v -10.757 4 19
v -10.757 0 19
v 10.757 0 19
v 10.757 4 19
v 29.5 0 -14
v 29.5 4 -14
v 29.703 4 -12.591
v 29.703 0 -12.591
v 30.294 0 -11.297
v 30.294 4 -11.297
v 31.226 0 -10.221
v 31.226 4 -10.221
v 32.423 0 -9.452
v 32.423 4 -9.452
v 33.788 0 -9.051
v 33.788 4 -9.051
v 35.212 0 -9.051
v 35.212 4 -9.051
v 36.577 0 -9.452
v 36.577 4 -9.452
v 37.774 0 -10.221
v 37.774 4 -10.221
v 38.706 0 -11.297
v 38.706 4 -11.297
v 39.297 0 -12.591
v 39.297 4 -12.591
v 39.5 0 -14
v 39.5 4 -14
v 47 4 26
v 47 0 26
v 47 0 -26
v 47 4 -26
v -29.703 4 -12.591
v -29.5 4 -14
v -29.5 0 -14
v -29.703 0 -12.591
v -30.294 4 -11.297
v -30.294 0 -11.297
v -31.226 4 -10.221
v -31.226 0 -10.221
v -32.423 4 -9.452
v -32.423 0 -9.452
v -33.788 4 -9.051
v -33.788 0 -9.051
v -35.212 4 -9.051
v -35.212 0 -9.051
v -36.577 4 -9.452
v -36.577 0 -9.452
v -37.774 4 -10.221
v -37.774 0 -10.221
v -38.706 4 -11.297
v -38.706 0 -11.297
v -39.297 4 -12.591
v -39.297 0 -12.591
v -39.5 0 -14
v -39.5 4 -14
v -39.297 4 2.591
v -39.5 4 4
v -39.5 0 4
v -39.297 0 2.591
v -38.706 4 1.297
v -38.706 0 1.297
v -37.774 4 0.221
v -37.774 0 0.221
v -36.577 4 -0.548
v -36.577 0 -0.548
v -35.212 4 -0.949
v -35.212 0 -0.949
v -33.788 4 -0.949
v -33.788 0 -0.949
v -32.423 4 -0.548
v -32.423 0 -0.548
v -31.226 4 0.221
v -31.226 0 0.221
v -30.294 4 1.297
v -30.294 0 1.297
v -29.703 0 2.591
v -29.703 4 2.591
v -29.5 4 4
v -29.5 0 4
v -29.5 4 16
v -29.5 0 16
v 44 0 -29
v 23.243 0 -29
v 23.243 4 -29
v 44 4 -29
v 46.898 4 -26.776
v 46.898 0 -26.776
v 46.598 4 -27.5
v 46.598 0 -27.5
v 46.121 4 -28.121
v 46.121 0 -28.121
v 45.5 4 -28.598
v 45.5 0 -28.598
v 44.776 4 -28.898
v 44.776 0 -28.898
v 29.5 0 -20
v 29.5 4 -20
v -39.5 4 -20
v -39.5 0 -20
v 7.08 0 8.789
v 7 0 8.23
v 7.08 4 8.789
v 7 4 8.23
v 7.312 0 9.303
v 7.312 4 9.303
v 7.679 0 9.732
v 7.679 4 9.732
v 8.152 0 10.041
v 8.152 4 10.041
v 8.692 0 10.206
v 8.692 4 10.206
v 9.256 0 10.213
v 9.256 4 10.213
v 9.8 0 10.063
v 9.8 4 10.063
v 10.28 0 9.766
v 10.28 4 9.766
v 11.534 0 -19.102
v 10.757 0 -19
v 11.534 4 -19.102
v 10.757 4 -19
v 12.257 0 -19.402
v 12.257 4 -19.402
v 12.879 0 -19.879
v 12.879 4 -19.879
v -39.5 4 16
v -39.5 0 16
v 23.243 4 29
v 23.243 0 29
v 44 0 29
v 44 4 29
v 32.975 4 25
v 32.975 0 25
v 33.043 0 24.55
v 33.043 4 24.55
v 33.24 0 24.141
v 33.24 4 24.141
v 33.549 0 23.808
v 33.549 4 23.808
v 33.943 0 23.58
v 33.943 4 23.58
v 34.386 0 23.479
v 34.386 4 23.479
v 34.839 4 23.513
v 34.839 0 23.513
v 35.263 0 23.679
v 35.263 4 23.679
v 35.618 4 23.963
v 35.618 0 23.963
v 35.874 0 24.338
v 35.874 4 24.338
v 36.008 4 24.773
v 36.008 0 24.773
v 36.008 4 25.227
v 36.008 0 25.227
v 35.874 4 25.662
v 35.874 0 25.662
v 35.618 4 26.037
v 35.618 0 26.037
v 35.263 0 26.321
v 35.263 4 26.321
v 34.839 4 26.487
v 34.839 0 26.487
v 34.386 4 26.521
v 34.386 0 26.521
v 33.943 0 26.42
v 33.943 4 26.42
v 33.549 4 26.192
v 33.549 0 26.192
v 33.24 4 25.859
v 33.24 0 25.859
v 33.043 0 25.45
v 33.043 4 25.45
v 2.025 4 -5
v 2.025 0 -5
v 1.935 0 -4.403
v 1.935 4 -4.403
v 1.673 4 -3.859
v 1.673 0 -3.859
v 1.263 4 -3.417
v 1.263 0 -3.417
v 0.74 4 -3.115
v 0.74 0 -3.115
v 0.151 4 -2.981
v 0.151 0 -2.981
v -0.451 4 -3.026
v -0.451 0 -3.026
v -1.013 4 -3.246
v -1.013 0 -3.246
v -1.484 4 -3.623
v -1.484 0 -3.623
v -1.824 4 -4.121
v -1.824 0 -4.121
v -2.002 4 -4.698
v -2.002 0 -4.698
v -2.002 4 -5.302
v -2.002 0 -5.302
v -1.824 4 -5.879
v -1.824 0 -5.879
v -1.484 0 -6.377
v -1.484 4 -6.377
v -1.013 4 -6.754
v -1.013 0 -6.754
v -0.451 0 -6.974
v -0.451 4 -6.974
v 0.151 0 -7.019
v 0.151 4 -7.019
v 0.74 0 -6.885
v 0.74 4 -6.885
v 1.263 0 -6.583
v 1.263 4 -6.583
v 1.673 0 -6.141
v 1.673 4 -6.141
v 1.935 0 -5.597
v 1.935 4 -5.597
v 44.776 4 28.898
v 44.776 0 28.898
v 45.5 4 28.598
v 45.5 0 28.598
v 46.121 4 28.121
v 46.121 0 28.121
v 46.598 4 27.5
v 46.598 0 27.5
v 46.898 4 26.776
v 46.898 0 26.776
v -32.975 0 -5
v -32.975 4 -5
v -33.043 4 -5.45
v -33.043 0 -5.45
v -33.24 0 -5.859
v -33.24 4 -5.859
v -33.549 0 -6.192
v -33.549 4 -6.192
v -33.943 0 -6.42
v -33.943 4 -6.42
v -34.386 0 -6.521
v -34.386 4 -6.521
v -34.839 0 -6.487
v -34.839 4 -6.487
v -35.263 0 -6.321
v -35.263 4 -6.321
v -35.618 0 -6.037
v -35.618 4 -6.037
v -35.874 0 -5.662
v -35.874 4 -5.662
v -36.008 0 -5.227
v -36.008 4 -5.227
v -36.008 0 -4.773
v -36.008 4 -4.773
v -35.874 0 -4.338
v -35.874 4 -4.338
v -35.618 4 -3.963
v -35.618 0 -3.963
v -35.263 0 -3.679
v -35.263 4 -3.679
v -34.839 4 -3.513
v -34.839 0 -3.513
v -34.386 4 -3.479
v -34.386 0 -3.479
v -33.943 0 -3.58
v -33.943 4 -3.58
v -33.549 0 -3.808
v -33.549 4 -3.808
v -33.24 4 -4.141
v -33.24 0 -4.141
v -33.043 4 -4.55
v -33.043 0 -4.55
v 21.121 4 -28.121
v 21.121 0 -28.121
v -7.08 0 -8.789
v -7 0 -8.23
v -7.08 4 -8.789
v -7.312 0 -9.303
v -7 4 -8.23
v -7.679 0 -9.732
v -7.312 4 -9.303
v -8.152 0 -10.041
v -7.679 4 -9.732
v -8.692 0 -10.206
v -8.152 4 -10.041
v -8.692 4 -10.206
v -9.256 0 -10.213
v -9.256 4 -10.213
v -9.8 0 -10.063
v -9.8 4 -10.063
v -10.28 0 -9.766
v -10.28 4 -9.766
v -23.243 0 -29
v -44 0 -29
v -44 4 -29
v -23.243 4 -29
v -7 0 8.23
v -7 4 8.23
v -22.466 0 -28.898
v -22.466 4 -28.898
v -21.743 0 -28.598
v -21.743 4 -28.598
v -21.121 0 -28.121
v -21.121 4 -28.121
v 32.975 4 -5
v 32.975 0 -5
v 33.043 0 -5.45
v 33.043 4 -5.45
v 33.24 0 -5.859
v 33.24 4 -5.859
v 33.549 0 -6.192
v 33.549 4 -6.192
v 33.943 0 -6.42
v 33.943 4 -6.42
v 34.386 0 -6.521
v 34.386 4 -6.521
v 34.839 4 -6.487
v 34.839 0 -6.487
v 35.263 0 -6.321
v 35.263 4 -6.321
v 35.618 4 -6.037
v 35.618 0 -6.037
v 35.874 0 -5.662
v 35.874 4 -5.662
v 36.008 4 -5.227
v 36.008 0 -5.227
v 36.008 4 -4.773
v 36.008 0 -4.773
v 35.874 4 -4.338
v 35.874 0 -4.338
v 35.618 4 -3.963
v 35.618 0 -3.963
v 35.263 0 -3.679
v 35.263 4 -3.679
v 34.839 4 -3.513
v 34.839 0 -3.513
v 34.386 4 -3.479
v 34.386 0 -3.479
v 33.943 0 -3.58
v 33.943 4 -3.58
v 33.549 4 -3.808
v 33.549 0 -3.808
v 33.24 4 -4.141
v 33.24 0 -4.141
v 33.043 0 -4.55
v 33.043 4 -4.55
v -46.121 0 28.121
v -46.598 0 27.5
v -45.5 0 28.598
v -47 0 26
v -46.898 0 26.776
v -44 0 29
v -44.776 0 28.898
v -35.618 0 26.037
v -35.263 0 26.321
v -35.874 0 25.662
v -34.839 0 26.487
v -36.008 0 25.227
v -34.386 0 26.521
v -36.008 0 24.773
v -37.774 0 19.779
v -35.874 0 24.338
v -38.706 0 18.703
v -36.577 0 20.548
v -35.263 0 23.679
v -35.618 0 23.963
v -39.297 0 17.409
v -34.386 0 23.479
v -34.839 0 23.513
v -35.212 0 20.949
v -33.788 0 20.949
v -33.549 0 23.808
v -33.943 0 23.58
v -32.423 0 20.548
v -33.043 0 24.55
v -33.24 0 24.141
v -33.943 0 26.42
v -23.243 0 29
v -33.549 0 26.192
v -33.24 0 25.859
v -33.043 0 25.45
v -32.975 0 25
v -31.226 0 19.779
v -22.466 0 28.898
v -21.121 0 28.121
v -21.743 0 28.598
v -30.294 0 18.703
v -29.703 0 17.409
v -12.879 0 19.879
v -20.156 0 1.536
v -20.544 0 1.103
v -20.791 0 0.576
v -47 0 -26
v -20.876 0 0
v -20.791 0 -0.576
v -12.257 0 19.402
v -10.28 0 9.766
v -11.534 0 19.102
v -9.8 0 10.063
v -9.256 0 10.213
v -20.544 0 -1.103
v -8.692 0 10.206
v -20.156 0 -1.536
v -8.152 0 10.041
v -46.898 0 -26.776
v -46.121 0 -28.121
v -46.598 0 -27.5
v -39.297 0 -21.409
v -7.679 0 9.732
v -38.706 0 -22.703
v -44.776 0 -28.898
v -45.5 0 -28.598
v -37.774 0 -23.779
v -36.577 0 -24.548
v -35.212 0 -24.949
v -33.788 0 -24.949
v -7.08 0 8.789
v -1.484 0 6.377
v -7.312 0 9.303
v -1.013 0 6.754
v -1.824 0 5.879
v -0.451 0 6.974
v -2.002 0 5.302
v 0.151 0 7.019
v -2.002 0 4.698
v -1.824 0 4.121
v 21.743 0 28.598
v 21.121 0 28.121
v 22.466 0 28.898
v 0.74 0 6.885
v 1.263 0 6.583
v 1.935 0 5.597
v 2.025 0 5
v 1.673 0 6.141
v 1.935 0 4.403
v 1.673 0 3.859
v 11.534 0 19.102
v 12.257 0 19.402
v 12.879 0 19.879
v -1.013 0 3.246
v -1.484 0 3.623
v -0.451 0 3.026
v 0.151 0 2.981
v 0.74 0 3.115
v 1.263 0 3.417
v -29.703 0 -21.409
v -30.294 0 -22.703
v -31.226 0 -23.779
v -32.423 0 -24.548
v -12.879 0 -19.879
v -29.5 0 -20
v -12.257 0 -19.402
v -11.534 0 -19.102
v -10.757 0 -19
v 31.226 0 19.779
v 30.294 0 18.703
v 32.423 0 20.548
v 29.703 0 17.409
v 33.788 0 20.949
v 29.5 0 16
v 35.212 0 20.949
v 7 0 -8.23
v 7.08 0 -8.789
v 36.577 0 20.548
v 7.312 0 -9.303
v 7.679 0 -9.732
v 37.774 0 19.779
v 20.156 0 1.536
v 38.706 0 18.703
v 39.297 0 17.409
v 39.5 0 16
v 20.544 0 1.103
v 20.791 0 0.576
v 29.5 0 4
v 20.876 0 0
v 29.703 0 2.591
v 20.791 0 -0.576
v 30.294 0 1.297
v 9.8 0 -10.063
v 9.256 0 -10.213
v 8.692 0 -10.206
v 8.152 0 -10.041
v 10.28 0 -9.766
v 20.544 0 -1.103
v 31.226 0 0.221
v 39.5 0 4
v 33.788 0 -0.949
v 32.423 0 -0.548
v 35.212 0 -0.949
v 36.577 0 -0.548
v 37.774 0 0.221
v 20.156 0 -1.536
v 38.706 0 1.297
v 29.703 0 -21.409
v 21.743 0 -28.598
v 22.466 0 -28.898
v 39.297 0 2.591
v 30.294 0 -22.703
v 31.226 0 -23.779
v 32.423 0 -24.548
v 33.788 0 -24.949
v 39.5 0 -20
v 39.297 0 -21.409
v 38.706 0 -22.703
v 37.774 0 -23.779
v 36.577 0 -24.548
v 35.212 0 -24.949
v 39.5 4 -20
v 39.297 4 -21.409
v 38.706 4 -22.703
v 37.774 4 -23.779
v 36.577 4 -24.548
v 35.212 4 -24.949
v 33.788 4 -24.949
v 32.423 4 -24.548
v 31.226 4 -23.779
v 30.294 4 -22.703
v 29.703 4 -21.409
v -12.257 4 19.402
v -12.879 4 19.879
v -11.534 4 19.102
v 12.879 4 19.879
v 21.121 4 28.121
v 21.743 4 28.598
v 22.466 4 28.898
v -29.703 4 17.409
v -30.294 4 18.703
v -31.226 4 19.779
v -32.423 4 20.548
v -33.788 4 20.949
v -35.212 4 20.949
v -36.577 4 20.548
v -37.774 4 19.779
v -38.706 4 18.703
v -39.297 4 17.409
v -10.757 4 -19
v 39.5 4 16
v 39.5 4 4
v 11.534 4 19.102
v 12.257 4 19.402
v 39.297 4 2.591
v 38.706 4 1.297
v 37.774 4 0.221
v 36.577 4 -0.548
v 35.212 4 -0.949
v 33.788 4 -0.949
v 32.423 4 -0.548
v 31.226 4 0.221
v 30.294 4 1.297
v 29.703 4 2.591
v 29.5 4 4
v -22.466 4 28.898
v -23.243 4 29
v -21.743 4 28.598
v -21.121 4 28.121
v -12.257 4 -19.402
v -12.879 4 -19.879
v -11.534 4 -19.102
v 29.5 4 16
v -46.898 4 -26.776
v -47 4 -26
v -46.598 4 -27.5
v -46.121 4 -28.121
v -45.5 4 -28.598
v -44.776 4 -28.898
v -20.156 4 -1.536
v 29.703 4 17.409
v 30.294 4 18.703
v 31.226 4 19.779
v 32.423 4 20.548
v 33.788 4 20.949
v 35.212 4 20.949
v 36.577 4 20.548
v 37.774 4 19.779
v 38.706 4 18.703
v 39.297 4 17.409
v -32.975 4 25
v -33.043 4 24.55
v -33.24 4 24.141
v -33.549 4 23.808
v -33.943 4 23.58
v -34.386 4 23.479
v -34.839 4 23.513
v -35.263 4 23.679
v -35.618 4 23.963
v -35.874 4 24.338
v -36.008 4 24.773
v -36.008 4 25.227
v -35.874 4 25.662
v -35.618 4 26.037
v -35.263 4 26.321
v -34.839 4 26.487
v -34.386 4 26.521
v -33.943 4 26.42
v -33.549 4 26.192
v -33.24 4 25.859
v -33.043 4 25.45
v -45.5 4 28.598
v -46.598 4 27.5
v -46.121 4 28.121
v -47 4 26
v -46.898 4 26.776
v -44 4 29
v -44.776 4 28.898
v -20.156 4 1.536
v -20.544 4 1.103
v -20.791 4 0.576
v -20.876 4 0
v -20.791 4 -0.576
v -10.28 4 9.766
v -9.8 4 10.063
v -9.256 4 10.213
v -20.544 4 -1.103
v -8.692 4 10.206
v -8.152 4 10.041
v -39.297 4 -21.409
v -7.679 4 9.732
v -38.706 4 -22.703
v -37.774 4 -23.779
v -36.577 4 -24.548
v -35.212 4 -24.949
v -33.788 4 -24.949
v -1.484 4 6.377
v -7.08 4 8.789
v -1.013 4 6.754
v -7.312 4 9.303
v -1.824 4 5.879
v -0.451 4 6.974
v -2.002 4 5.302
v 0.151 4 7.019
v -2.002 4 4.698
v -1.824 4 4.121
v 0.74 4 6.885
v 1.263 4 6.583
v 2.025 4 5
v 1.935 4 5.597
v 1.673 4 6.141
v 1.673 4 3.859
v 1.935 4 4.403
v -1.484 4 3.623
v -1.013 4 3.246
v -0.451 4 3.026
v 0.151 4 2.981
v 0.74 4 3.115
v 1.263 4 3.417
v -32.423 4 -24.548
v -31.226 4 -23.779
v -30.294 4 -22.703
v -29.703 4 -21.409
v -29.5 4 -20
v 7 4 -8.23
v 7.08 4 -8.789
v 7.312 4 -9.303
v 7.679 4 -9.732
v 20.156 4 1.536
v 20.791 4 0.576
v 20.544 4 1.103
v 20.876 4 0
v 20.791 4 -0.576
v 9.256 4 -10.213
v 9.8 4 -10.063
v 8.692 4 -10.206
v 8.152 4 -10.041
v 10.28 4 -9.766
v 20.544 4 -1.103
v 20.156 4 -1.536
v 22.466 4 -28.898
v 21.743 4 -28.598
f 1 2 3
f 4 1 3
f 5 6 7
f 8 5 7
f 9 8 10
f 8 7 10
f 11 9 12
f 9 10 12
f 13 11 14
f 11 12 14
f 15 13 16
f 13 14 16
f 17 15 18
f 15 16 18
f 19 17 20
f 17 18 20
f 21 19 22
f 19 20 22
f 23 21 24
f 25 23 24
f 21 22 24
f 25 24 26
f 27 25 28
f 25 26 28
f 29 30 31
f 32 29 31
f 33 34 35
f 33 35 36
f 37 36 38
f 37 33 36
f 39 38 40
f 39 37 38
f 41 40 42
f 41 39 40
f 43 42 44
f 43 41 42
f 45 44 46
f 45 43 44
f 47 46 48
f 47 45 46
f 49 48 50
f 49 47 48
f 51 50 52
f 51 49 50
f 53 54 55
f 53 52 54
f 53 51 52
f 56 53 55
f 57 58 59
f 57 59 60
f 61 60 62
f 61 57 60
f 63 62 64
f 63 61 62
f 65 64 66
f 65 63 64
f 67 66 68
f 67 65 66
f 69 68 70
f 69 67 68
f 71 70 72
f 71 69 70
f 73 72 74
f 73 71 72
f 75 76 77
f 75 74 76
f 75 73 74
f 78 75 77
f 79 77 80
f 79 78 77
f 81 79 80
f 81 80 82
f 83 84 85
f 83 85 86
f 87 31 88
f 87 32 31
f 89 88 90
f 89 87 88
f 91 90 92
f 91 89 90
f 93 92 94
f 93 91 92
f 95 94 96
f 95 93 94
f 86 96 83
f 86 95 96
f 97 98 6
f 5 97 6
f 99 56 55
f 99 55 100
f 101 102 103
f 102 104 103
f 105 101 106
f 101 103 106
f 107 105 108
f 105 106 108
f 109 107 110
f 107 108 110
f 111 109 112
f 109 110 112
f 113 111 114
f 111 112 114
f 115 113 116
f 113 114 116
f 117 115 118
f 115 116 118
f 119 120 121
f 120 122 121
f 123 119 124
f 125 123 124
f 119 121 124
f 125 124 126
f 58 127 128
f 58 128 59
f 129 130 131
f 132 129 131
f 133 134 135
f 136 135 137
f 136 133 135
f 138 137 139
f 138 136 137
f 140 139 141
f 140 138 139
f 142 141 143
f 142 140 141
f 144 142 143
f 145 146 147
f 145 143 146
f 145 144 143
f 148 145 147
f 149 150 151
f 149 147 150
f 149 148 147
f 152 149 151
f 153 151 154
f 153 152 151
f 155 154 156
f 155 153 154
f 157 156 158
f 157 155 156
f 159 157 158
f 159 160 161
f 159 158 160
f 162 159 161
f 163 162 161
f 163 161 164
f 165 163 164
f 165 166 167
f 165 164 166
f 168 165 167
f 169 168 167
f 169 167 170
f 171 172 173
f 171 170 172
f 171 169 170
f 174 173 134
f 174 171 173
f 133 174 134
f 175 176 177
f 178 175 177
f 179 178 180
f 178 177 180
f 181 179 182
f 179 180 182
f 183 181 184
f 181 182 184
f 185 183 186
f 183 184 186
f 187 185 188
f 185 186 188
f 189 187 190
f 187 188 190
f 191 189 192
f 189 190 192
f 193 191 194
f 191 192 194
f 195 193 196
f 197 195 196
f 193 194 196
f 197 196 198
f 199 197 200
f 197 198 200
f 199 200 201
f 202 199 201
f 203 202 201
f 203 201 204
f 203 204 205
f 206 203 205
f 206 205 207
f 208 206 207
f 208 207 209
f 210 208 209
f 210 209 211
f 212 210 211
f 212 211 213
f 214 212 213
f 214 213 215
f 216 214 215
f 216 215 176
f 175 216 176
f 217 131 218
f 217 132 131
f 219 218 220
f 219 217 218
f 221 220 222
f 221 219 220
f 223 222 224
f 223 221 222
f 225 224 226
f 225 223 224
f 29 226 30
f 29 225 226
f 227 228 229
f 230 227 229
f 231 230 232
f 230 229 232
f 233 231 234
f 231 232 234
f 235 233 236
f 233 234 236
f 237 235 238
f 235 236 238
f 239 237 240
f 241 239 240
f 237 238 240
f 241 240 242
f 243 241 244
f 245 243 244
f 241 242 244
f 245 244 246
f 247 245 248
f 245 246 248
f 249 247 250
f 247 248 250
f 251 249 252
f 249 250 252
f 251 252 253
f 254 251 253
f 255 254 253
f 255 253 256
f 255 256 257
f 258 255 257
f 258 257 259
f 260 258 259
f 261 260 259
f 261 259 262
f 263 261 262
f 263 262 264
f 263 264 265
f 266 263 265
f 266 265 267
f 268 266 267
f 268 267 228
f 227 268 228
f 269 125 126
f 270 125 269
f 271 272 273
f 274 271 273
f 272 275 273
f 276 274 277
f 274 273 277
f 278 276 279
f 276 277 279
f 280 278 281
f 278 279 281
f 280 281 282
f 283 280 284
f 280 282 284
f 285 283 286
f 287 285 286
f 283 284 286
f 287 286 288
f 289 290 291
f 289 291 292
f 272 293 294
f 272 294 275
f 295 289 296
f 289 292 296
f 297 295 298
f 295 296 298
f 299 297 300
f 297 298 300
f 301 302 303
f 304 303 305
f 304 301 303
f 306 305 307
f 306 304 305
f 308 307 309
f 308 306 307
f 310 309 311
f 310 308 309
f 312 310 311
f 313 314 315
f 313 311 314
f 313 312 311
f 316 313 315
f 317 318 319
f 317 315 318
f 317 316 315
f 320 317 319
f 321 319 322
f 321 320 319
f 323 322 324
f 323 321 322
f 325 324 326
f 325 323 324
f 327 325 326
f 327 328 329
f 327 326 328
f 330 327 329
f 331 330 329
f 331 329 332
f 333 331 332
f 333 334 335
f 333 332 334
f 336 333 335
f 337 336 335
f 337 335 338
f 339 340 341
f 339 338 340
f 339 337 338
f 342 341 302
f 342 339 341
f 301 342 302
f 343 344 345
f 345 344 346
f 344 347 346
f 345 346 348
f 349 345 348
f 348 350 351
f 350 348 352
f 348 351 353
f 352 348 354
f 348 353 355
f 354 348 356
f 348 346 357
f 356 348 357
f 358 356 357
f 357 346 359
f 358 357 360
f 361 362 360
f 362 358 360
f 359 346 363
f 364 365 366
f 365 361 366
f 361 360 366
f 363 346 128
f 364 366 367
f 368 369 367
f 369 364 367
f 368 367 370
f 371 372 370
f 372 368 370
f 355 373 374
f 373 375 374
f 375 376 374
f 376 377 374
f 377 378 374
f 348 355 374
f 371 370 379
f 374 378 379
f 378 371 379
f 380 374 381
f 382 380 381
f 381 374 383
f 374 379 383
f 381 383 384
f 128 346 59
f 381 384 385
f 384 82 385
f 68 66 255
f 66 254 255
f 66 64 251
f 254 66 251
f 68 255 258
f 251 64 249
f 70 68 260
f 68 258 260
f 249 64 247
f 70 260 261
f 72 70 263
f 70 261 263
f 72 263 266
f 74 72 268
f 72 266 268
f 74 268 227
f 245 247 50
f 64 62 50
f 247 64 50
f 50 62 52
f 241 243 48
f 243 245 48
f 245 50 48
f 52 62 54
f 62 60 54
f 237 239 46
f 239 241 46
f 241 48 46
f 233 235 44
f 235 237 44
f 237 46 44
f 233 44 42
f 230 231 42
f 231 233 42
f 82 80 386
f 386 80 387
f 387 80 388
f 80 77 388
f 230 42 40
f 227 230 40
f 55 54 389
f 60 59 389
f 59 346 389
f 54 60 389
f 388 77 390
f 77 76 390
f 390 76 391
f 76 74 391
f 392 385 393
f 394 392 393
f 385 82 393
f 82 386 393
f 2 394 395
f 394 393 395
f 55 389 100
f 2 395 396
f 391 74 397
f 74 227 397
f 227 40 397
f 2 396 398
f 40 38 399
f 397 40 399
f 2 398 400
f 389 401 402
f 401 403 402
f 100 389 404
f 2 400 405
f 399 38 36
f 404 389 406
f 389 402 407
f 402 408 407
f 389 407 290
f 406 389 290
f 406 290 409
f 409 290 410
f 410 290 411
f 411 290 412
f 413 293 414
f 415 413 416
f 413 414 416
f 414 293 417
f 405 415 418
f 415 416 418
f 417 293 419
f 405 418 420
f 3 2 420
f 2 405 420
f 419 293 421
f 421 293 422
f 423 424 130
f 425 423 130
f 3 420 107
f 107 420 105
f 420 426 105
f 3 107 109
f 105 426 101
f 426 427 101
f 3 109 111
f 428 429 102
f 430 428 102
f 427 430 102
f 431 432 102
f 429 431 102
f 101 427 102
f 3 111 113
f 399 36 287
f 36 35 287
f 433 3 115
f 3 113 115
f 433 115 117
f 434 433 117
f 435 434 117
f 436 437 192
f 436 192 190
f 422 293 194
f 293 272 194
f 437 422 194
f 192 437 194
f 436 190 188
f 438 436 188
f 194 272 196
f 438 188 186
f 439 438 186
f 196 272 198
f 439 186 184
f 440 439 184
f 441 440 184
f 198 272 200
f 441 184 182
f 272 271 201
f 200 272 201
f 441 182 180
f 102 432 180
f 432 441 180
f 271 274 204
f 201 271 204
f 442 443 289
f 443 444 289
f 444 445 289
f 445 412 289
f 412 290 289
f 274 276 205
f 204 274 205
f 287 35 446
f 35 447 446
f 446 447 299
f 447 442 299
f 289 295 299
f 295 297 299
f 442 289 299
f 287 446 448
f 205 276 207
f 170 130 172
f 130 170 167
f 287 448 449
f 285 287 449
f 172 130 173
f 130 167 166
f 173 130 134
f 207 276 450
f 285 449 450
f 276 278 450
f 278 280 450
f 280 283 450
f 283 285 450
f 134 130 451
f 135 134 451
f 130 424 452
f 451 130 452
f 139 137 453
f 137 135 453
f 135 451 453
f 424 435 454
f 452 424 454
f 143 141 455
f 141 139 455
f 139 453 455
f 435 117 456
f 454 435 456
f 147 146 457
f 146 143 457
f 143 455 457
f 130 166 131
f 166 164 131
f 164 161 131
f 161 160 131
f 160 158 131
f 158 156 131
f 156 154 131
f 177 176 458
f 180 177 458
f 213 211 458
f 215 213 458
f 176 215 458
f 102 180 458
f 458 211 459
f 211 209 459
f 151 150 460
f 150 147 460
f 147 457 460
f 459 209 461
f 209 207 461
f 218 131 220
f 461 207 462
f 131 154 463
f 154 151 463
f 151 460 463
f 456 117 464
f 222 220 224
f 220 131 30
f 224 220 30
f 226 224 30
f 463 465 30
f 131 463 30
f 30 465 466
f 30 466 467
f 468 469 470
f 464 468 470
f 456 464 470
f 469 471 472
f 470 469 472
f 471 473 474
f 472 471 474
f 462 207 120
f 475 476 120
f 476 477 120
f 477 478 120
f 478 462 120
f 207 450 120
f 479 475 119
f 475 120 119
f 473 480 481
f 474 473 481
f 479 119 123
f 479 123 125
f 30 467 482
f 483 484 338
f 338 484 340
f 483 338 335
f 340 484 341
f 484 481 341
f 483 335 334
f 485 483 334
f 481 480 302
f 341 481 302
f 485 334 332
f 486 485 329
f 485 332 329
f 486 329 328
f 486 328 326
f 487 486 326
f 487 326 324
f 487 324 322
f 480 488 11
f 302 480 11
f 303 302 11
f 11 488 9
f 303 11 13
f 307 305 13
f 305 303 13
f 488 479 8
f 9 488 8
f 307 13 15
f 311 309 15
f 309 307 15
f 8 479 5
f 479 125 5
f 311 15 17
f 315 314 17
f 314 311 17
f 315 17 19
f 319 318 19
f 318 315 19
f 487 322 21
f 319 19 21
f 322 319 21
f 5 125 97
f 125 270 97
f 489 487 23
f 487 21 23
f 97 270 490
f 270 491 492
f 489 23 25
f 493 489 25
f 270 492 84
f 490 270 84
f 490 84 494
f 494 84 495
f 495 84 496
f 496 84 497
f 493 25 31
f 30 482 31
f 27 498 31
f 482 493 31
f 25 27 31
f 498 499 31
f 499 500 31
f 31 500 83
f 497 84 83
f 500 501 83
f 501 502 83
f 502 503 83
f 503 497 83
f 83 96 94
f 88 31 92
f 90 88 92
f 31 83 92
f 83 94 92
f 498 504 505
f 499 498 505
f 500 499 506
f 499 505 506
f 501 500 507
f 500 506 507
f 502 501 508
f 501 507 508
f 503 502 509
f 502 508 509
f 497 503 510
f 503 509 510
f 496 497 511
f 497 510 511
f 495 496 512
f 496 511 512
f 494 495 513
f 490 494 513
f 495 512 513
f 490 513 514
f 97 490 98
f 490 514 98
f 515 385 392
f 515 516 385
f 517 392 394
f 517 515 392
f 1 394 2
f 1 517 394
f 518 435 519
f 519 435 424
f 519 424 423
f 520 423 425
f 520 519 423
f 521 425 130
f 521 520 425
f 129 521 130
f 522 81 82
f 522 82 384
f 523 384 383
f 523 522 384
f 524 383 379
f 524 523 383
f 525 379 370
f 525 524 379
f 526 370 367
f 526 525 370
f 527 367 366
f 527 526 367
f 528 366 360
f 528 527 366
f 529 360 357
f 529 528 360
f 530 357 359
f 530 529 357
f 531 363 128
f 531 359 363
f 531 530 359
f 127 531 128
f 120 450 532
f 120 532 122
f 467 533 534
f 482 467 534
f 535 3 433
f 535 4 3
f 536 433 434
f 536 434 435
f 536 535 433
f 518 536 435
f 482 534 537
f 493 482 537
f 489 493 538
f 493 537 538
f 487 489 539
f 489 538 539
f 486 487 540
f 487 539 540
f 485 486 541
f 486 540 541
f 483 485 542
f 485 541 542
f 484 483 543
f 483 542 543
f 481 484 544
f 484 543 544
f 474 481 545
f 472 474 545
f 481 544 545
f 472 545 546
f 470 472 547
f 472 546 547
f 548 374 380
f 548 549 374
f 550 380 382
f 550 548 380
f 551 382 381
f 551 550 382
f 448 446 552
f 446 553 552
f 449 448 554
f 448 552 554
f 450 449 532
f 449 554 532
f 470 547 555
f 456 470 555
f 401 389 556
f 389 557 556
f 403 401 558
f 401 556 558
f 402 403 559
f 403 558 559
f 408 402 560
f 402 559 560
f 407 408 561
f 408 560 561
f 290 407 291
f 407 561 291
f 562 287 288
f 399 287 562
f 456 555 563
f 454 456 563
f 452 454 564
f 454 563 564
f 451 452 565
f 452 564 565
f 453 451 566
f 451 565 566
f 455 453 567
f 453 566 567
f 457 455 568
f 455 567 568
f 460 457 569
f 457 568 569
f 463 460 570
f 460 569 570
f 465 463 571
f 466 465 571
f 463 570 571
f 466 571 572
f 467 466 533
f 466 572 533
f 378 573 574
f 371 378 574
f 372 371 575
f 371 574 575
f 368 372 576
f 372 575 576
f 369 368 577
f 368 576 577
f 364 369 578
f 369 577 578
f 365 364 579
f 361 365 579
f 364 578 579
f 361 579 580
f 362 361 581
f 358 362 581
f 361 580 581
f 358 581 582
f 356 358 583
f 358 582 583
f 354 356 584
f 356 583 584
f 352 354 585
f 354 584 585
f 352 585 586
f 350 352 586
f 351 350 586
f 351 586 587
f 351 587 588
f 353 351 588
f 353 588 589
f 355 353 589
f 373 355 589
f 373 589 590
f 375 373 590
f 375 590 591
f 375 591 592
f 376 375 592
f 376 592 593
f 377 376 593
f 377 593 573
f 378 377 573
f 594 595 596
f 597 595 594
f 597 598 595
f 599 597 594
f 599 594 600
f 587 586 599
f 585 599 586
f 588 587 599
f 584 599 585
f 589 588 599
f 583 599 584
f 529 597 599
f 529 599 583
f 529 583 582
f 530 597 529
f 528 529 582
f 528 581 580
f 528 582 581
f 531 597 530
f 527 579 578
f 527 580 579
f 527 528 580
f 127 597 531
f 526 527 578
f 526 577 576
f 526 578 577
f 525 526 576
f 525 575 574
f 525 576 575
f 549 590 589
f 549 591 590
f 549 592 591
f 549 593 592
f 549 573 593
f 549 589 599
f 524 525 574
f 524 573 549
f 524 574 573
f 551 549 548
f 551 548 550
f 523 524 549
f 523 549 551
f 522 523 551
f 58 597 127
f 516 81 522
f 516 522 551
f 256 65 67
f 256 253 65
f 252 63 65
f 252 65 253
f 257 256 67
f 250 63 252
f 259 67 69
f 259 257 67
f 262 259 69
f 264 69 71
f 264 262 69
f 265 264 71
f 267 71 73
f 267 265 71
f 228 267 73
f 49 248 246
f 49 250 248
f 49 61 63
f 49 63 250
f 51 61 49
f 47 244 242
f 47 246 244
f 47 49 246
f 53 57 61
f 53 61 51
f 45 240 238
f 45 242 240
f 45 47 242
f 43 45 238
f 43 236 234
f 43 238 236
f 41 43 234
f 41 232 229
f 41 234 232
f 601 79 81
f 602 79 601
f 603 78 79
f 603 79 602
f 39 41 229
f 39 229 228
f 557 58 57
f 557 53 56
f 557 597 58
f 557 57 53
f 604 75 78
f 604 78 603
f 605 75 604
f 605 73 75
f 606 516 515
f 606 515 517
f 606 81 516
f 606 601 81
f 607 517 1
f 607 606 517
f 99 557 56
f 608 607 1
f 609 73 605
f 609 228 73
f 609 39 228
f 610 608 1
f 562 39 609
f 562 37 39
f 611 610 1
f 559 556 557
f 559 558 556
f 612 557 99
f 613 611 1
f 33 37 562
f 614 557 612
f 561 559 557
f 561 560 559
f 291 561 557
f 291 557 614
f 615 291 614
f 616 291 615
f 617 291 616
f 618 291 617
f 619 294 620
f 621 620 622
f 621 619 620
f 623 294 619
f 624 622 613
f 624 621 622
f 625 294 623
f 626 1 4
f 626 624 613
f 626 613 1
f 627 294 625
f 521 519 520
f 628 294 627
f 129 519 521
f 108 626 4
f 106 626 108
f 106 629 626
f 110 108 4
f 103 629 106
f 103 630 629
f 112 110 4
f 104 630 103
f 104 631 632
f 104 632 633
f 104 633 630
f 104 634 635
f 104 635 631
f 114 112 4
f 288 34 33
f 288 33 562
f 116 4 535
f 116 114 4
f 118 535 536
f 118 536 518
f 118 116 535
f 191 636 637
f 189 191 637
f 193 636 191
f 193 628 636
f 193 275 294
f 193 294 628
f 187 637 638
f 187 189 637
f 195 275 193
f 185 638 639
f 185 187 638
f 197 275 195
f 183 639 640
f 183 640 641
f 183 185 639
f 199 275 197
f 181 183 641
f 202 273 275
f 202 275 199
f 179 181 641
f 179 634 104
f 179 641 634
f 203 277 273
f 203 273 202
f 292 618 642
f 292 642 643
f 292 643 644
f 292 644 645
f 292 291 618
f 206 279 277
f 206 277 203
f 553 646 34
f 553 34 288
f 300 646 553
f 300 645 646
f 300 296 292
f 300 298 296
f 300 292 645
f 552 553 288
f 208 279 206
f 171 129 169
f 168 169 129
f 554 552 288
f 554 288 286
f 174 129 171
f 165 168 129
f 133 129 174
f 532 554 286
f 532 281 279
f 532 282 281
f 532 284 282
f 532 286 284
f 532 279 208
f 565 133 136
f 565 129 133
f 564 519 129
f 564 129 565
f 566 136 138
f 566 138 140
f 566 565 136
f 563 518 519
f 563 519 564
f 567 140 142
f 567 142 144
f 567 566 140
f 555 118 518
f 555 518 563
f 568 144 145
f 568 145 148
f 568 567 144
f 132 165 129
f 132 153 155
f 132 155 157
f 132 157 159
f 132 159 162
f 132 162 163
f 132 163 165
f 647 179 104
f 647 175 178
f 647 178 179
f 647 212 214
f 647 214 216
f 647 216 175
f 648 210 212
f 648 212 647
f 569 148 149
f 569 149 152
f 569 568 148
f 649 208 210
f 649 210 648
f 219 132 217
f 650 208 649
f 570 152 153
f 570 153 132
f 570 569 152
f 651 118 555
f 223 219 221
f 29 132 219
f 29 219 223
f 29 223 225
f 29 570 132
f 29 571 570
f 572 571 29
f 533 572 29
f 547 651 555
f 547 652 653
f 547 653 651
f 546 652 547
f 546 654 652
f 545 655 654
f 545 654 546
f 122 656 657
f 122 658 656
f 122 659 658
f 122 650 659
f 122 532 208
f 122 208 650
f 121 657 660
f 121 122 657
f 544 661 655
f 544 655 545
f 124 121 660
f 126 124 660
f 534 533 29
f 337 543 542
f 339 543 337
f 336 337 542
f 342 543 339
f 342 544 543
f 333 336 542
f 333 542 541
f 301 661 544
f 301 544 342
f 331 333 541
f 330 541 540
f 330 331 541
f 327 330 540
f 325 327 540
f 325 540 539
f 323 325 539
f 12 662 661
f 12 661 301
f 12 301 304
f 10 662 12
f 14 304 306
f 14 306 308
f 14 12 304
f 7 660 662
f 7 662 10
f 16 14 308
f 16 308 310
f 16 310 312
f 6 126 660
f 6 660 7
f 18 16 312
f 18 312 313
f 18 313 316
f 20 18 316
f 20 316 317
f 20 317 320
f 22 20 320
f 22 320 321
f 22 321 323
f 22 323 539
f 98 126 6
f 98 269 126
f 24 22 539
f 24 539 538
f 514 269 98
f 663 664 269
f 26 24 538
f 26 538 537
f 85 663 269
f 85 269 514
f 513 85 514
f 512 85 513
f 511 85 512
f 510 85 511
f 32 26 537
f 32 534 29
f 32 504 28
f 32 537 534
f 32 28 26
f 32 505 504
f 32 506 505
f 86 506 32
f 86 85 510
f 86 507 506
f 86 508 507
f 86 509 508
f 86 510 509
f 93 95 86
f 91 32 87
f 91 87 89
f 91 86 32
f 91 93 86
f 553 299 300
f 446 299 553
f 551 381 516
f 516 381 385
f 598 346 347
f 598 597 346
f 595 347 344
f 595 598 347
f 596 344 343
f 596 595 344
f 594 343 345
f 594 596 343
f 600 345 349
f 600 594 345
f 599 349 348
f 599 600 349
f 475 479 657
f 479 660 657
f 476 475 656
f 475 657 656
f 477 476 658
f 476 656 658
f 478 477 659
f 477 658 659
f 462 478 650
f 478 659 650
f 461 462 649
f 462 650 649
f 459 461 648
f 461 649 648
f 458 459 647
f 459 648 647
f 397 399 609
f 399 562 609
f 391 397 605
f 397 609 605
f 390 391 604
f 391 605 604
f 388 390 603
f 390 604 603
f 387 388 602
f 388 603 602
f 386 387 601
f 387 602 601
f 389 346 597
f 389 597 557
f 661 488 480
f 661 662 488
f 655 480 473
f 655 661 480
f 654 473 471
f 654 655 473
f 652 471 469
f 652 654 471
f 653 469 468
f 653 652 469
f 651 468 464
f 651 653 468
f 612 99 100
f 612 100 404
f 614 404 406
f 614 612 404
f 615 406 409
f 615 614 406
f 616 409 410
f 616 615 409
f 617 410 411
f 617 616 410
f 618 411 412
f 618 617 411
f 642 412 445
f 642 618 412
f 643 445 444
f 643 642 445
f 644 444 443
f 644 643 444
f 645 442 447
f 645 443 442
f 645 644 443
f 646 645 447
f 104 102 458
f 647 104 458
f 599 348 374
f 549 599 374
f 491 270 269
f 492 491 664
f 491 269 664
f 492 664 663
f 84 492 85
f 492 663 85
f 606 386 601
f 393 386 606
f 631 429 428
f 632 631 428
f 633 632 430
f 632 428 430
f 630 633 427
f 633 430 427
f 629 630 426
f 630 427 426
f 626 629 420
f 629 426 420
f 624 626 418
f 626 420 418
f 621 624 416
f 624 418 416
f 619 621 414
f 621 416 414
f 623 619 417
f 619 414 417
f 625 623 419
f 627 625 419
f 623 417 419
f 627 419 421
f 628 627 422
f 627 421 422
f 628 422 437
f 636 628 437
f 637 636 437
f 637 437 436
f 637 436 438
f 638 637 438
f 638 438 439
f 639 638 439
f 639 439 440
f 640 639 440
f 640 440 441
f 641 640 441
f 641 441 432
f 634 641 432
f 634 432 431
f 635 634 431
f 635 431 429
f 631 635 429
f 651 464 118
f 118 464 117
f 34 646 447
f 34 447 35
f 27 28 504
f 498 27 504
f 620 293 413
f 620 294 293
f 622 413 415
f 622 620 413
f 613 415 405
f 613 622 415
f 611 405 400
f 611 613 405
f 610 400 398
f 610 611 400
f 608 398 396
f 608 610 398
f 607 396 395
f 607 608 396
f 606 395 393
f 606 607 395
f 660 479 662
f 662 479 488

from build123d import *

# Parameters (mm, degrees)
SKETCH_1_W          = 94
SKETCH_1_H          = 58
EXTRUDE_1_DEPTH     = 4
FILLET_1_R          = 3
SKETCH_2_R          = 1.525
CUT_EXTRUDE_1_DEPTH = 10
CUT_EXTRUDE_2_DEPTH = 10
SKETCH_4_R          = 2.025
CUT_EXTRUDE_3_DEPTH = 10
CUT_EXTRUDE_4_DEPTH = 10
FILLET_2_R          = 2
FILLET_3_R          = 3


with BuildPart() as part:
    # 草图1 → 凸台-拉伸1 (new body)
    with BuildSketch(Plane(origin=(0, 0, 0), x_dir=(1, 0, 0), z_dir=(0, 1, 0))):
        Rectangle(SKETCH_1_W, SKETCH_1_H)
    extrude(amount=EXTRUDE_1_DEPTH)

    # 圆角1
    fillet_1_edges = [part.edges().sort_by_distance(p)[0] for p in [
        (47, 2, 29),
        (-47, 2, 29),
        (-47, 2, -29),
        (47, 2, -29),
    ]]
    fillet(fillet_1_edges, radius=FILLET_1_R)

    # 草图2 → 切除-拉伸1 (cut)
    with BuildSketch(Plane(origin=(0, 4, 0), x_dir=(1, 0, 0), z_dir=(0, 1, 0))):
        with Locations((-34.500000003, 5)):
            Circle(SKETCH_2_R)
        with Locations((-34.500000003, -25)):
            Circle(SKETCH_2_R)
        with BuildLine():
            Line((-39.500000003, 14), (-39.500000003, 20))
            ThreePointArc((-39.500000003, 20), (-34.500000003, 25), (-29.500000003, 20))
            Line((-29.500000003, 20), (-29.500000003, 14))
            ThreePointArc((-29.500000003, 14), (-34.500000003, 9), (-39.500000003, 14))
        make_face()
        with BuildLine():
            Line((-39.500000003, -16), (-39.500000003, -4))
            ThreePointArc((-39.500000003, -4), (-34.500000003, 1), (-29.500000003, -4))
            Line((-29.500000003, -4), (-29.500000003, -16))
            ThreePointArc((-29.500000003, -16), (-34.500000003, -21), (-39.500000003, -16))
        make_face()
    cut_extrude_1 = extrude(amount=-CUT_EXTRUDE_1_DEPTH, mode=Mode.SUBTRACT)

    # 镜向1: 切除-拉伸1 across plane
    add(cut_extrude_1.mirror(Plane(origin=(0, 0, 0), x_dir=(0, 0, 1), z_dir=(1, 0, 0))), mode=Mode.SUBTRACT)

    # 草图3 → 切除-拉伸2 (cut)
    with BuildSketch(Plane.XZ):
        Polygon((-22, 29), (-12, 19), (12, 19), (22, 29), align=None)
    cut_extrude_2 = extrude(amount=-CUT_EXTRUDE_2_DEPTH, mode=Mode.SUBTRACT)

    # 镜向2: 切除-拉伸2 across plane
    add(cut_extrude_2.mirror(Plane.XY), mode=Mode.SUBTRACT)

    # 草图4 → 切除-拉伸3 (cut)
    with BuildSketch(Plane.XZ):
        with Locations((0, 5)):
            Circle(SKETCH_4_R)
        with Locations((0, -5)):
            Circle(SKETCH_4_R)
    extrude(amount=-CUT_EXTRUDE_3_DEPTH, mode=Mode.SUBTRACT)

    # 草图5 → 切除-拉伸4 (cut)
    with BuildSketch(Plane.XZ):
        Polygon((-7, 12.5), (-7, -12.5), (-22, 0), align=None)
        Polygon((22, 0), (7, 12.5), (7, -12.5), align=None)
    extrude(amount=-CUT_EXTRUDE_4_DEPTH, mode=Mode.SUBTRACT)

    # 圆角2
    fillet_2_edges = [part.edges().sort_by_distance(p)[0] for p in [
        (-22, 2, 0),
        (-7, 2, 12.5),
        (-7, 2, -12.5),
        (22, 2, 0),
        (7, 2, -12.5),
        (7, 2, 12.5),
    ]]
    fillet(fillet_2_edges, radius=FILLET_2_R)

    # 圆角3
    fillet_3_edges = [part.edges().sort_by_distance(p)[0] for p in [
        (-22, 2, 29),
        (22, 2, 29),
        (12, 2, 19),
        (-12, 2, 19),
        (22, 2, -29),
        (-22, 2, -29),
        (-12, 2, -19),
        (12, 2, -19),
    ]]
    fillet(fillet_3_edges, radius=FILLET_3_R)


solid = part.part
